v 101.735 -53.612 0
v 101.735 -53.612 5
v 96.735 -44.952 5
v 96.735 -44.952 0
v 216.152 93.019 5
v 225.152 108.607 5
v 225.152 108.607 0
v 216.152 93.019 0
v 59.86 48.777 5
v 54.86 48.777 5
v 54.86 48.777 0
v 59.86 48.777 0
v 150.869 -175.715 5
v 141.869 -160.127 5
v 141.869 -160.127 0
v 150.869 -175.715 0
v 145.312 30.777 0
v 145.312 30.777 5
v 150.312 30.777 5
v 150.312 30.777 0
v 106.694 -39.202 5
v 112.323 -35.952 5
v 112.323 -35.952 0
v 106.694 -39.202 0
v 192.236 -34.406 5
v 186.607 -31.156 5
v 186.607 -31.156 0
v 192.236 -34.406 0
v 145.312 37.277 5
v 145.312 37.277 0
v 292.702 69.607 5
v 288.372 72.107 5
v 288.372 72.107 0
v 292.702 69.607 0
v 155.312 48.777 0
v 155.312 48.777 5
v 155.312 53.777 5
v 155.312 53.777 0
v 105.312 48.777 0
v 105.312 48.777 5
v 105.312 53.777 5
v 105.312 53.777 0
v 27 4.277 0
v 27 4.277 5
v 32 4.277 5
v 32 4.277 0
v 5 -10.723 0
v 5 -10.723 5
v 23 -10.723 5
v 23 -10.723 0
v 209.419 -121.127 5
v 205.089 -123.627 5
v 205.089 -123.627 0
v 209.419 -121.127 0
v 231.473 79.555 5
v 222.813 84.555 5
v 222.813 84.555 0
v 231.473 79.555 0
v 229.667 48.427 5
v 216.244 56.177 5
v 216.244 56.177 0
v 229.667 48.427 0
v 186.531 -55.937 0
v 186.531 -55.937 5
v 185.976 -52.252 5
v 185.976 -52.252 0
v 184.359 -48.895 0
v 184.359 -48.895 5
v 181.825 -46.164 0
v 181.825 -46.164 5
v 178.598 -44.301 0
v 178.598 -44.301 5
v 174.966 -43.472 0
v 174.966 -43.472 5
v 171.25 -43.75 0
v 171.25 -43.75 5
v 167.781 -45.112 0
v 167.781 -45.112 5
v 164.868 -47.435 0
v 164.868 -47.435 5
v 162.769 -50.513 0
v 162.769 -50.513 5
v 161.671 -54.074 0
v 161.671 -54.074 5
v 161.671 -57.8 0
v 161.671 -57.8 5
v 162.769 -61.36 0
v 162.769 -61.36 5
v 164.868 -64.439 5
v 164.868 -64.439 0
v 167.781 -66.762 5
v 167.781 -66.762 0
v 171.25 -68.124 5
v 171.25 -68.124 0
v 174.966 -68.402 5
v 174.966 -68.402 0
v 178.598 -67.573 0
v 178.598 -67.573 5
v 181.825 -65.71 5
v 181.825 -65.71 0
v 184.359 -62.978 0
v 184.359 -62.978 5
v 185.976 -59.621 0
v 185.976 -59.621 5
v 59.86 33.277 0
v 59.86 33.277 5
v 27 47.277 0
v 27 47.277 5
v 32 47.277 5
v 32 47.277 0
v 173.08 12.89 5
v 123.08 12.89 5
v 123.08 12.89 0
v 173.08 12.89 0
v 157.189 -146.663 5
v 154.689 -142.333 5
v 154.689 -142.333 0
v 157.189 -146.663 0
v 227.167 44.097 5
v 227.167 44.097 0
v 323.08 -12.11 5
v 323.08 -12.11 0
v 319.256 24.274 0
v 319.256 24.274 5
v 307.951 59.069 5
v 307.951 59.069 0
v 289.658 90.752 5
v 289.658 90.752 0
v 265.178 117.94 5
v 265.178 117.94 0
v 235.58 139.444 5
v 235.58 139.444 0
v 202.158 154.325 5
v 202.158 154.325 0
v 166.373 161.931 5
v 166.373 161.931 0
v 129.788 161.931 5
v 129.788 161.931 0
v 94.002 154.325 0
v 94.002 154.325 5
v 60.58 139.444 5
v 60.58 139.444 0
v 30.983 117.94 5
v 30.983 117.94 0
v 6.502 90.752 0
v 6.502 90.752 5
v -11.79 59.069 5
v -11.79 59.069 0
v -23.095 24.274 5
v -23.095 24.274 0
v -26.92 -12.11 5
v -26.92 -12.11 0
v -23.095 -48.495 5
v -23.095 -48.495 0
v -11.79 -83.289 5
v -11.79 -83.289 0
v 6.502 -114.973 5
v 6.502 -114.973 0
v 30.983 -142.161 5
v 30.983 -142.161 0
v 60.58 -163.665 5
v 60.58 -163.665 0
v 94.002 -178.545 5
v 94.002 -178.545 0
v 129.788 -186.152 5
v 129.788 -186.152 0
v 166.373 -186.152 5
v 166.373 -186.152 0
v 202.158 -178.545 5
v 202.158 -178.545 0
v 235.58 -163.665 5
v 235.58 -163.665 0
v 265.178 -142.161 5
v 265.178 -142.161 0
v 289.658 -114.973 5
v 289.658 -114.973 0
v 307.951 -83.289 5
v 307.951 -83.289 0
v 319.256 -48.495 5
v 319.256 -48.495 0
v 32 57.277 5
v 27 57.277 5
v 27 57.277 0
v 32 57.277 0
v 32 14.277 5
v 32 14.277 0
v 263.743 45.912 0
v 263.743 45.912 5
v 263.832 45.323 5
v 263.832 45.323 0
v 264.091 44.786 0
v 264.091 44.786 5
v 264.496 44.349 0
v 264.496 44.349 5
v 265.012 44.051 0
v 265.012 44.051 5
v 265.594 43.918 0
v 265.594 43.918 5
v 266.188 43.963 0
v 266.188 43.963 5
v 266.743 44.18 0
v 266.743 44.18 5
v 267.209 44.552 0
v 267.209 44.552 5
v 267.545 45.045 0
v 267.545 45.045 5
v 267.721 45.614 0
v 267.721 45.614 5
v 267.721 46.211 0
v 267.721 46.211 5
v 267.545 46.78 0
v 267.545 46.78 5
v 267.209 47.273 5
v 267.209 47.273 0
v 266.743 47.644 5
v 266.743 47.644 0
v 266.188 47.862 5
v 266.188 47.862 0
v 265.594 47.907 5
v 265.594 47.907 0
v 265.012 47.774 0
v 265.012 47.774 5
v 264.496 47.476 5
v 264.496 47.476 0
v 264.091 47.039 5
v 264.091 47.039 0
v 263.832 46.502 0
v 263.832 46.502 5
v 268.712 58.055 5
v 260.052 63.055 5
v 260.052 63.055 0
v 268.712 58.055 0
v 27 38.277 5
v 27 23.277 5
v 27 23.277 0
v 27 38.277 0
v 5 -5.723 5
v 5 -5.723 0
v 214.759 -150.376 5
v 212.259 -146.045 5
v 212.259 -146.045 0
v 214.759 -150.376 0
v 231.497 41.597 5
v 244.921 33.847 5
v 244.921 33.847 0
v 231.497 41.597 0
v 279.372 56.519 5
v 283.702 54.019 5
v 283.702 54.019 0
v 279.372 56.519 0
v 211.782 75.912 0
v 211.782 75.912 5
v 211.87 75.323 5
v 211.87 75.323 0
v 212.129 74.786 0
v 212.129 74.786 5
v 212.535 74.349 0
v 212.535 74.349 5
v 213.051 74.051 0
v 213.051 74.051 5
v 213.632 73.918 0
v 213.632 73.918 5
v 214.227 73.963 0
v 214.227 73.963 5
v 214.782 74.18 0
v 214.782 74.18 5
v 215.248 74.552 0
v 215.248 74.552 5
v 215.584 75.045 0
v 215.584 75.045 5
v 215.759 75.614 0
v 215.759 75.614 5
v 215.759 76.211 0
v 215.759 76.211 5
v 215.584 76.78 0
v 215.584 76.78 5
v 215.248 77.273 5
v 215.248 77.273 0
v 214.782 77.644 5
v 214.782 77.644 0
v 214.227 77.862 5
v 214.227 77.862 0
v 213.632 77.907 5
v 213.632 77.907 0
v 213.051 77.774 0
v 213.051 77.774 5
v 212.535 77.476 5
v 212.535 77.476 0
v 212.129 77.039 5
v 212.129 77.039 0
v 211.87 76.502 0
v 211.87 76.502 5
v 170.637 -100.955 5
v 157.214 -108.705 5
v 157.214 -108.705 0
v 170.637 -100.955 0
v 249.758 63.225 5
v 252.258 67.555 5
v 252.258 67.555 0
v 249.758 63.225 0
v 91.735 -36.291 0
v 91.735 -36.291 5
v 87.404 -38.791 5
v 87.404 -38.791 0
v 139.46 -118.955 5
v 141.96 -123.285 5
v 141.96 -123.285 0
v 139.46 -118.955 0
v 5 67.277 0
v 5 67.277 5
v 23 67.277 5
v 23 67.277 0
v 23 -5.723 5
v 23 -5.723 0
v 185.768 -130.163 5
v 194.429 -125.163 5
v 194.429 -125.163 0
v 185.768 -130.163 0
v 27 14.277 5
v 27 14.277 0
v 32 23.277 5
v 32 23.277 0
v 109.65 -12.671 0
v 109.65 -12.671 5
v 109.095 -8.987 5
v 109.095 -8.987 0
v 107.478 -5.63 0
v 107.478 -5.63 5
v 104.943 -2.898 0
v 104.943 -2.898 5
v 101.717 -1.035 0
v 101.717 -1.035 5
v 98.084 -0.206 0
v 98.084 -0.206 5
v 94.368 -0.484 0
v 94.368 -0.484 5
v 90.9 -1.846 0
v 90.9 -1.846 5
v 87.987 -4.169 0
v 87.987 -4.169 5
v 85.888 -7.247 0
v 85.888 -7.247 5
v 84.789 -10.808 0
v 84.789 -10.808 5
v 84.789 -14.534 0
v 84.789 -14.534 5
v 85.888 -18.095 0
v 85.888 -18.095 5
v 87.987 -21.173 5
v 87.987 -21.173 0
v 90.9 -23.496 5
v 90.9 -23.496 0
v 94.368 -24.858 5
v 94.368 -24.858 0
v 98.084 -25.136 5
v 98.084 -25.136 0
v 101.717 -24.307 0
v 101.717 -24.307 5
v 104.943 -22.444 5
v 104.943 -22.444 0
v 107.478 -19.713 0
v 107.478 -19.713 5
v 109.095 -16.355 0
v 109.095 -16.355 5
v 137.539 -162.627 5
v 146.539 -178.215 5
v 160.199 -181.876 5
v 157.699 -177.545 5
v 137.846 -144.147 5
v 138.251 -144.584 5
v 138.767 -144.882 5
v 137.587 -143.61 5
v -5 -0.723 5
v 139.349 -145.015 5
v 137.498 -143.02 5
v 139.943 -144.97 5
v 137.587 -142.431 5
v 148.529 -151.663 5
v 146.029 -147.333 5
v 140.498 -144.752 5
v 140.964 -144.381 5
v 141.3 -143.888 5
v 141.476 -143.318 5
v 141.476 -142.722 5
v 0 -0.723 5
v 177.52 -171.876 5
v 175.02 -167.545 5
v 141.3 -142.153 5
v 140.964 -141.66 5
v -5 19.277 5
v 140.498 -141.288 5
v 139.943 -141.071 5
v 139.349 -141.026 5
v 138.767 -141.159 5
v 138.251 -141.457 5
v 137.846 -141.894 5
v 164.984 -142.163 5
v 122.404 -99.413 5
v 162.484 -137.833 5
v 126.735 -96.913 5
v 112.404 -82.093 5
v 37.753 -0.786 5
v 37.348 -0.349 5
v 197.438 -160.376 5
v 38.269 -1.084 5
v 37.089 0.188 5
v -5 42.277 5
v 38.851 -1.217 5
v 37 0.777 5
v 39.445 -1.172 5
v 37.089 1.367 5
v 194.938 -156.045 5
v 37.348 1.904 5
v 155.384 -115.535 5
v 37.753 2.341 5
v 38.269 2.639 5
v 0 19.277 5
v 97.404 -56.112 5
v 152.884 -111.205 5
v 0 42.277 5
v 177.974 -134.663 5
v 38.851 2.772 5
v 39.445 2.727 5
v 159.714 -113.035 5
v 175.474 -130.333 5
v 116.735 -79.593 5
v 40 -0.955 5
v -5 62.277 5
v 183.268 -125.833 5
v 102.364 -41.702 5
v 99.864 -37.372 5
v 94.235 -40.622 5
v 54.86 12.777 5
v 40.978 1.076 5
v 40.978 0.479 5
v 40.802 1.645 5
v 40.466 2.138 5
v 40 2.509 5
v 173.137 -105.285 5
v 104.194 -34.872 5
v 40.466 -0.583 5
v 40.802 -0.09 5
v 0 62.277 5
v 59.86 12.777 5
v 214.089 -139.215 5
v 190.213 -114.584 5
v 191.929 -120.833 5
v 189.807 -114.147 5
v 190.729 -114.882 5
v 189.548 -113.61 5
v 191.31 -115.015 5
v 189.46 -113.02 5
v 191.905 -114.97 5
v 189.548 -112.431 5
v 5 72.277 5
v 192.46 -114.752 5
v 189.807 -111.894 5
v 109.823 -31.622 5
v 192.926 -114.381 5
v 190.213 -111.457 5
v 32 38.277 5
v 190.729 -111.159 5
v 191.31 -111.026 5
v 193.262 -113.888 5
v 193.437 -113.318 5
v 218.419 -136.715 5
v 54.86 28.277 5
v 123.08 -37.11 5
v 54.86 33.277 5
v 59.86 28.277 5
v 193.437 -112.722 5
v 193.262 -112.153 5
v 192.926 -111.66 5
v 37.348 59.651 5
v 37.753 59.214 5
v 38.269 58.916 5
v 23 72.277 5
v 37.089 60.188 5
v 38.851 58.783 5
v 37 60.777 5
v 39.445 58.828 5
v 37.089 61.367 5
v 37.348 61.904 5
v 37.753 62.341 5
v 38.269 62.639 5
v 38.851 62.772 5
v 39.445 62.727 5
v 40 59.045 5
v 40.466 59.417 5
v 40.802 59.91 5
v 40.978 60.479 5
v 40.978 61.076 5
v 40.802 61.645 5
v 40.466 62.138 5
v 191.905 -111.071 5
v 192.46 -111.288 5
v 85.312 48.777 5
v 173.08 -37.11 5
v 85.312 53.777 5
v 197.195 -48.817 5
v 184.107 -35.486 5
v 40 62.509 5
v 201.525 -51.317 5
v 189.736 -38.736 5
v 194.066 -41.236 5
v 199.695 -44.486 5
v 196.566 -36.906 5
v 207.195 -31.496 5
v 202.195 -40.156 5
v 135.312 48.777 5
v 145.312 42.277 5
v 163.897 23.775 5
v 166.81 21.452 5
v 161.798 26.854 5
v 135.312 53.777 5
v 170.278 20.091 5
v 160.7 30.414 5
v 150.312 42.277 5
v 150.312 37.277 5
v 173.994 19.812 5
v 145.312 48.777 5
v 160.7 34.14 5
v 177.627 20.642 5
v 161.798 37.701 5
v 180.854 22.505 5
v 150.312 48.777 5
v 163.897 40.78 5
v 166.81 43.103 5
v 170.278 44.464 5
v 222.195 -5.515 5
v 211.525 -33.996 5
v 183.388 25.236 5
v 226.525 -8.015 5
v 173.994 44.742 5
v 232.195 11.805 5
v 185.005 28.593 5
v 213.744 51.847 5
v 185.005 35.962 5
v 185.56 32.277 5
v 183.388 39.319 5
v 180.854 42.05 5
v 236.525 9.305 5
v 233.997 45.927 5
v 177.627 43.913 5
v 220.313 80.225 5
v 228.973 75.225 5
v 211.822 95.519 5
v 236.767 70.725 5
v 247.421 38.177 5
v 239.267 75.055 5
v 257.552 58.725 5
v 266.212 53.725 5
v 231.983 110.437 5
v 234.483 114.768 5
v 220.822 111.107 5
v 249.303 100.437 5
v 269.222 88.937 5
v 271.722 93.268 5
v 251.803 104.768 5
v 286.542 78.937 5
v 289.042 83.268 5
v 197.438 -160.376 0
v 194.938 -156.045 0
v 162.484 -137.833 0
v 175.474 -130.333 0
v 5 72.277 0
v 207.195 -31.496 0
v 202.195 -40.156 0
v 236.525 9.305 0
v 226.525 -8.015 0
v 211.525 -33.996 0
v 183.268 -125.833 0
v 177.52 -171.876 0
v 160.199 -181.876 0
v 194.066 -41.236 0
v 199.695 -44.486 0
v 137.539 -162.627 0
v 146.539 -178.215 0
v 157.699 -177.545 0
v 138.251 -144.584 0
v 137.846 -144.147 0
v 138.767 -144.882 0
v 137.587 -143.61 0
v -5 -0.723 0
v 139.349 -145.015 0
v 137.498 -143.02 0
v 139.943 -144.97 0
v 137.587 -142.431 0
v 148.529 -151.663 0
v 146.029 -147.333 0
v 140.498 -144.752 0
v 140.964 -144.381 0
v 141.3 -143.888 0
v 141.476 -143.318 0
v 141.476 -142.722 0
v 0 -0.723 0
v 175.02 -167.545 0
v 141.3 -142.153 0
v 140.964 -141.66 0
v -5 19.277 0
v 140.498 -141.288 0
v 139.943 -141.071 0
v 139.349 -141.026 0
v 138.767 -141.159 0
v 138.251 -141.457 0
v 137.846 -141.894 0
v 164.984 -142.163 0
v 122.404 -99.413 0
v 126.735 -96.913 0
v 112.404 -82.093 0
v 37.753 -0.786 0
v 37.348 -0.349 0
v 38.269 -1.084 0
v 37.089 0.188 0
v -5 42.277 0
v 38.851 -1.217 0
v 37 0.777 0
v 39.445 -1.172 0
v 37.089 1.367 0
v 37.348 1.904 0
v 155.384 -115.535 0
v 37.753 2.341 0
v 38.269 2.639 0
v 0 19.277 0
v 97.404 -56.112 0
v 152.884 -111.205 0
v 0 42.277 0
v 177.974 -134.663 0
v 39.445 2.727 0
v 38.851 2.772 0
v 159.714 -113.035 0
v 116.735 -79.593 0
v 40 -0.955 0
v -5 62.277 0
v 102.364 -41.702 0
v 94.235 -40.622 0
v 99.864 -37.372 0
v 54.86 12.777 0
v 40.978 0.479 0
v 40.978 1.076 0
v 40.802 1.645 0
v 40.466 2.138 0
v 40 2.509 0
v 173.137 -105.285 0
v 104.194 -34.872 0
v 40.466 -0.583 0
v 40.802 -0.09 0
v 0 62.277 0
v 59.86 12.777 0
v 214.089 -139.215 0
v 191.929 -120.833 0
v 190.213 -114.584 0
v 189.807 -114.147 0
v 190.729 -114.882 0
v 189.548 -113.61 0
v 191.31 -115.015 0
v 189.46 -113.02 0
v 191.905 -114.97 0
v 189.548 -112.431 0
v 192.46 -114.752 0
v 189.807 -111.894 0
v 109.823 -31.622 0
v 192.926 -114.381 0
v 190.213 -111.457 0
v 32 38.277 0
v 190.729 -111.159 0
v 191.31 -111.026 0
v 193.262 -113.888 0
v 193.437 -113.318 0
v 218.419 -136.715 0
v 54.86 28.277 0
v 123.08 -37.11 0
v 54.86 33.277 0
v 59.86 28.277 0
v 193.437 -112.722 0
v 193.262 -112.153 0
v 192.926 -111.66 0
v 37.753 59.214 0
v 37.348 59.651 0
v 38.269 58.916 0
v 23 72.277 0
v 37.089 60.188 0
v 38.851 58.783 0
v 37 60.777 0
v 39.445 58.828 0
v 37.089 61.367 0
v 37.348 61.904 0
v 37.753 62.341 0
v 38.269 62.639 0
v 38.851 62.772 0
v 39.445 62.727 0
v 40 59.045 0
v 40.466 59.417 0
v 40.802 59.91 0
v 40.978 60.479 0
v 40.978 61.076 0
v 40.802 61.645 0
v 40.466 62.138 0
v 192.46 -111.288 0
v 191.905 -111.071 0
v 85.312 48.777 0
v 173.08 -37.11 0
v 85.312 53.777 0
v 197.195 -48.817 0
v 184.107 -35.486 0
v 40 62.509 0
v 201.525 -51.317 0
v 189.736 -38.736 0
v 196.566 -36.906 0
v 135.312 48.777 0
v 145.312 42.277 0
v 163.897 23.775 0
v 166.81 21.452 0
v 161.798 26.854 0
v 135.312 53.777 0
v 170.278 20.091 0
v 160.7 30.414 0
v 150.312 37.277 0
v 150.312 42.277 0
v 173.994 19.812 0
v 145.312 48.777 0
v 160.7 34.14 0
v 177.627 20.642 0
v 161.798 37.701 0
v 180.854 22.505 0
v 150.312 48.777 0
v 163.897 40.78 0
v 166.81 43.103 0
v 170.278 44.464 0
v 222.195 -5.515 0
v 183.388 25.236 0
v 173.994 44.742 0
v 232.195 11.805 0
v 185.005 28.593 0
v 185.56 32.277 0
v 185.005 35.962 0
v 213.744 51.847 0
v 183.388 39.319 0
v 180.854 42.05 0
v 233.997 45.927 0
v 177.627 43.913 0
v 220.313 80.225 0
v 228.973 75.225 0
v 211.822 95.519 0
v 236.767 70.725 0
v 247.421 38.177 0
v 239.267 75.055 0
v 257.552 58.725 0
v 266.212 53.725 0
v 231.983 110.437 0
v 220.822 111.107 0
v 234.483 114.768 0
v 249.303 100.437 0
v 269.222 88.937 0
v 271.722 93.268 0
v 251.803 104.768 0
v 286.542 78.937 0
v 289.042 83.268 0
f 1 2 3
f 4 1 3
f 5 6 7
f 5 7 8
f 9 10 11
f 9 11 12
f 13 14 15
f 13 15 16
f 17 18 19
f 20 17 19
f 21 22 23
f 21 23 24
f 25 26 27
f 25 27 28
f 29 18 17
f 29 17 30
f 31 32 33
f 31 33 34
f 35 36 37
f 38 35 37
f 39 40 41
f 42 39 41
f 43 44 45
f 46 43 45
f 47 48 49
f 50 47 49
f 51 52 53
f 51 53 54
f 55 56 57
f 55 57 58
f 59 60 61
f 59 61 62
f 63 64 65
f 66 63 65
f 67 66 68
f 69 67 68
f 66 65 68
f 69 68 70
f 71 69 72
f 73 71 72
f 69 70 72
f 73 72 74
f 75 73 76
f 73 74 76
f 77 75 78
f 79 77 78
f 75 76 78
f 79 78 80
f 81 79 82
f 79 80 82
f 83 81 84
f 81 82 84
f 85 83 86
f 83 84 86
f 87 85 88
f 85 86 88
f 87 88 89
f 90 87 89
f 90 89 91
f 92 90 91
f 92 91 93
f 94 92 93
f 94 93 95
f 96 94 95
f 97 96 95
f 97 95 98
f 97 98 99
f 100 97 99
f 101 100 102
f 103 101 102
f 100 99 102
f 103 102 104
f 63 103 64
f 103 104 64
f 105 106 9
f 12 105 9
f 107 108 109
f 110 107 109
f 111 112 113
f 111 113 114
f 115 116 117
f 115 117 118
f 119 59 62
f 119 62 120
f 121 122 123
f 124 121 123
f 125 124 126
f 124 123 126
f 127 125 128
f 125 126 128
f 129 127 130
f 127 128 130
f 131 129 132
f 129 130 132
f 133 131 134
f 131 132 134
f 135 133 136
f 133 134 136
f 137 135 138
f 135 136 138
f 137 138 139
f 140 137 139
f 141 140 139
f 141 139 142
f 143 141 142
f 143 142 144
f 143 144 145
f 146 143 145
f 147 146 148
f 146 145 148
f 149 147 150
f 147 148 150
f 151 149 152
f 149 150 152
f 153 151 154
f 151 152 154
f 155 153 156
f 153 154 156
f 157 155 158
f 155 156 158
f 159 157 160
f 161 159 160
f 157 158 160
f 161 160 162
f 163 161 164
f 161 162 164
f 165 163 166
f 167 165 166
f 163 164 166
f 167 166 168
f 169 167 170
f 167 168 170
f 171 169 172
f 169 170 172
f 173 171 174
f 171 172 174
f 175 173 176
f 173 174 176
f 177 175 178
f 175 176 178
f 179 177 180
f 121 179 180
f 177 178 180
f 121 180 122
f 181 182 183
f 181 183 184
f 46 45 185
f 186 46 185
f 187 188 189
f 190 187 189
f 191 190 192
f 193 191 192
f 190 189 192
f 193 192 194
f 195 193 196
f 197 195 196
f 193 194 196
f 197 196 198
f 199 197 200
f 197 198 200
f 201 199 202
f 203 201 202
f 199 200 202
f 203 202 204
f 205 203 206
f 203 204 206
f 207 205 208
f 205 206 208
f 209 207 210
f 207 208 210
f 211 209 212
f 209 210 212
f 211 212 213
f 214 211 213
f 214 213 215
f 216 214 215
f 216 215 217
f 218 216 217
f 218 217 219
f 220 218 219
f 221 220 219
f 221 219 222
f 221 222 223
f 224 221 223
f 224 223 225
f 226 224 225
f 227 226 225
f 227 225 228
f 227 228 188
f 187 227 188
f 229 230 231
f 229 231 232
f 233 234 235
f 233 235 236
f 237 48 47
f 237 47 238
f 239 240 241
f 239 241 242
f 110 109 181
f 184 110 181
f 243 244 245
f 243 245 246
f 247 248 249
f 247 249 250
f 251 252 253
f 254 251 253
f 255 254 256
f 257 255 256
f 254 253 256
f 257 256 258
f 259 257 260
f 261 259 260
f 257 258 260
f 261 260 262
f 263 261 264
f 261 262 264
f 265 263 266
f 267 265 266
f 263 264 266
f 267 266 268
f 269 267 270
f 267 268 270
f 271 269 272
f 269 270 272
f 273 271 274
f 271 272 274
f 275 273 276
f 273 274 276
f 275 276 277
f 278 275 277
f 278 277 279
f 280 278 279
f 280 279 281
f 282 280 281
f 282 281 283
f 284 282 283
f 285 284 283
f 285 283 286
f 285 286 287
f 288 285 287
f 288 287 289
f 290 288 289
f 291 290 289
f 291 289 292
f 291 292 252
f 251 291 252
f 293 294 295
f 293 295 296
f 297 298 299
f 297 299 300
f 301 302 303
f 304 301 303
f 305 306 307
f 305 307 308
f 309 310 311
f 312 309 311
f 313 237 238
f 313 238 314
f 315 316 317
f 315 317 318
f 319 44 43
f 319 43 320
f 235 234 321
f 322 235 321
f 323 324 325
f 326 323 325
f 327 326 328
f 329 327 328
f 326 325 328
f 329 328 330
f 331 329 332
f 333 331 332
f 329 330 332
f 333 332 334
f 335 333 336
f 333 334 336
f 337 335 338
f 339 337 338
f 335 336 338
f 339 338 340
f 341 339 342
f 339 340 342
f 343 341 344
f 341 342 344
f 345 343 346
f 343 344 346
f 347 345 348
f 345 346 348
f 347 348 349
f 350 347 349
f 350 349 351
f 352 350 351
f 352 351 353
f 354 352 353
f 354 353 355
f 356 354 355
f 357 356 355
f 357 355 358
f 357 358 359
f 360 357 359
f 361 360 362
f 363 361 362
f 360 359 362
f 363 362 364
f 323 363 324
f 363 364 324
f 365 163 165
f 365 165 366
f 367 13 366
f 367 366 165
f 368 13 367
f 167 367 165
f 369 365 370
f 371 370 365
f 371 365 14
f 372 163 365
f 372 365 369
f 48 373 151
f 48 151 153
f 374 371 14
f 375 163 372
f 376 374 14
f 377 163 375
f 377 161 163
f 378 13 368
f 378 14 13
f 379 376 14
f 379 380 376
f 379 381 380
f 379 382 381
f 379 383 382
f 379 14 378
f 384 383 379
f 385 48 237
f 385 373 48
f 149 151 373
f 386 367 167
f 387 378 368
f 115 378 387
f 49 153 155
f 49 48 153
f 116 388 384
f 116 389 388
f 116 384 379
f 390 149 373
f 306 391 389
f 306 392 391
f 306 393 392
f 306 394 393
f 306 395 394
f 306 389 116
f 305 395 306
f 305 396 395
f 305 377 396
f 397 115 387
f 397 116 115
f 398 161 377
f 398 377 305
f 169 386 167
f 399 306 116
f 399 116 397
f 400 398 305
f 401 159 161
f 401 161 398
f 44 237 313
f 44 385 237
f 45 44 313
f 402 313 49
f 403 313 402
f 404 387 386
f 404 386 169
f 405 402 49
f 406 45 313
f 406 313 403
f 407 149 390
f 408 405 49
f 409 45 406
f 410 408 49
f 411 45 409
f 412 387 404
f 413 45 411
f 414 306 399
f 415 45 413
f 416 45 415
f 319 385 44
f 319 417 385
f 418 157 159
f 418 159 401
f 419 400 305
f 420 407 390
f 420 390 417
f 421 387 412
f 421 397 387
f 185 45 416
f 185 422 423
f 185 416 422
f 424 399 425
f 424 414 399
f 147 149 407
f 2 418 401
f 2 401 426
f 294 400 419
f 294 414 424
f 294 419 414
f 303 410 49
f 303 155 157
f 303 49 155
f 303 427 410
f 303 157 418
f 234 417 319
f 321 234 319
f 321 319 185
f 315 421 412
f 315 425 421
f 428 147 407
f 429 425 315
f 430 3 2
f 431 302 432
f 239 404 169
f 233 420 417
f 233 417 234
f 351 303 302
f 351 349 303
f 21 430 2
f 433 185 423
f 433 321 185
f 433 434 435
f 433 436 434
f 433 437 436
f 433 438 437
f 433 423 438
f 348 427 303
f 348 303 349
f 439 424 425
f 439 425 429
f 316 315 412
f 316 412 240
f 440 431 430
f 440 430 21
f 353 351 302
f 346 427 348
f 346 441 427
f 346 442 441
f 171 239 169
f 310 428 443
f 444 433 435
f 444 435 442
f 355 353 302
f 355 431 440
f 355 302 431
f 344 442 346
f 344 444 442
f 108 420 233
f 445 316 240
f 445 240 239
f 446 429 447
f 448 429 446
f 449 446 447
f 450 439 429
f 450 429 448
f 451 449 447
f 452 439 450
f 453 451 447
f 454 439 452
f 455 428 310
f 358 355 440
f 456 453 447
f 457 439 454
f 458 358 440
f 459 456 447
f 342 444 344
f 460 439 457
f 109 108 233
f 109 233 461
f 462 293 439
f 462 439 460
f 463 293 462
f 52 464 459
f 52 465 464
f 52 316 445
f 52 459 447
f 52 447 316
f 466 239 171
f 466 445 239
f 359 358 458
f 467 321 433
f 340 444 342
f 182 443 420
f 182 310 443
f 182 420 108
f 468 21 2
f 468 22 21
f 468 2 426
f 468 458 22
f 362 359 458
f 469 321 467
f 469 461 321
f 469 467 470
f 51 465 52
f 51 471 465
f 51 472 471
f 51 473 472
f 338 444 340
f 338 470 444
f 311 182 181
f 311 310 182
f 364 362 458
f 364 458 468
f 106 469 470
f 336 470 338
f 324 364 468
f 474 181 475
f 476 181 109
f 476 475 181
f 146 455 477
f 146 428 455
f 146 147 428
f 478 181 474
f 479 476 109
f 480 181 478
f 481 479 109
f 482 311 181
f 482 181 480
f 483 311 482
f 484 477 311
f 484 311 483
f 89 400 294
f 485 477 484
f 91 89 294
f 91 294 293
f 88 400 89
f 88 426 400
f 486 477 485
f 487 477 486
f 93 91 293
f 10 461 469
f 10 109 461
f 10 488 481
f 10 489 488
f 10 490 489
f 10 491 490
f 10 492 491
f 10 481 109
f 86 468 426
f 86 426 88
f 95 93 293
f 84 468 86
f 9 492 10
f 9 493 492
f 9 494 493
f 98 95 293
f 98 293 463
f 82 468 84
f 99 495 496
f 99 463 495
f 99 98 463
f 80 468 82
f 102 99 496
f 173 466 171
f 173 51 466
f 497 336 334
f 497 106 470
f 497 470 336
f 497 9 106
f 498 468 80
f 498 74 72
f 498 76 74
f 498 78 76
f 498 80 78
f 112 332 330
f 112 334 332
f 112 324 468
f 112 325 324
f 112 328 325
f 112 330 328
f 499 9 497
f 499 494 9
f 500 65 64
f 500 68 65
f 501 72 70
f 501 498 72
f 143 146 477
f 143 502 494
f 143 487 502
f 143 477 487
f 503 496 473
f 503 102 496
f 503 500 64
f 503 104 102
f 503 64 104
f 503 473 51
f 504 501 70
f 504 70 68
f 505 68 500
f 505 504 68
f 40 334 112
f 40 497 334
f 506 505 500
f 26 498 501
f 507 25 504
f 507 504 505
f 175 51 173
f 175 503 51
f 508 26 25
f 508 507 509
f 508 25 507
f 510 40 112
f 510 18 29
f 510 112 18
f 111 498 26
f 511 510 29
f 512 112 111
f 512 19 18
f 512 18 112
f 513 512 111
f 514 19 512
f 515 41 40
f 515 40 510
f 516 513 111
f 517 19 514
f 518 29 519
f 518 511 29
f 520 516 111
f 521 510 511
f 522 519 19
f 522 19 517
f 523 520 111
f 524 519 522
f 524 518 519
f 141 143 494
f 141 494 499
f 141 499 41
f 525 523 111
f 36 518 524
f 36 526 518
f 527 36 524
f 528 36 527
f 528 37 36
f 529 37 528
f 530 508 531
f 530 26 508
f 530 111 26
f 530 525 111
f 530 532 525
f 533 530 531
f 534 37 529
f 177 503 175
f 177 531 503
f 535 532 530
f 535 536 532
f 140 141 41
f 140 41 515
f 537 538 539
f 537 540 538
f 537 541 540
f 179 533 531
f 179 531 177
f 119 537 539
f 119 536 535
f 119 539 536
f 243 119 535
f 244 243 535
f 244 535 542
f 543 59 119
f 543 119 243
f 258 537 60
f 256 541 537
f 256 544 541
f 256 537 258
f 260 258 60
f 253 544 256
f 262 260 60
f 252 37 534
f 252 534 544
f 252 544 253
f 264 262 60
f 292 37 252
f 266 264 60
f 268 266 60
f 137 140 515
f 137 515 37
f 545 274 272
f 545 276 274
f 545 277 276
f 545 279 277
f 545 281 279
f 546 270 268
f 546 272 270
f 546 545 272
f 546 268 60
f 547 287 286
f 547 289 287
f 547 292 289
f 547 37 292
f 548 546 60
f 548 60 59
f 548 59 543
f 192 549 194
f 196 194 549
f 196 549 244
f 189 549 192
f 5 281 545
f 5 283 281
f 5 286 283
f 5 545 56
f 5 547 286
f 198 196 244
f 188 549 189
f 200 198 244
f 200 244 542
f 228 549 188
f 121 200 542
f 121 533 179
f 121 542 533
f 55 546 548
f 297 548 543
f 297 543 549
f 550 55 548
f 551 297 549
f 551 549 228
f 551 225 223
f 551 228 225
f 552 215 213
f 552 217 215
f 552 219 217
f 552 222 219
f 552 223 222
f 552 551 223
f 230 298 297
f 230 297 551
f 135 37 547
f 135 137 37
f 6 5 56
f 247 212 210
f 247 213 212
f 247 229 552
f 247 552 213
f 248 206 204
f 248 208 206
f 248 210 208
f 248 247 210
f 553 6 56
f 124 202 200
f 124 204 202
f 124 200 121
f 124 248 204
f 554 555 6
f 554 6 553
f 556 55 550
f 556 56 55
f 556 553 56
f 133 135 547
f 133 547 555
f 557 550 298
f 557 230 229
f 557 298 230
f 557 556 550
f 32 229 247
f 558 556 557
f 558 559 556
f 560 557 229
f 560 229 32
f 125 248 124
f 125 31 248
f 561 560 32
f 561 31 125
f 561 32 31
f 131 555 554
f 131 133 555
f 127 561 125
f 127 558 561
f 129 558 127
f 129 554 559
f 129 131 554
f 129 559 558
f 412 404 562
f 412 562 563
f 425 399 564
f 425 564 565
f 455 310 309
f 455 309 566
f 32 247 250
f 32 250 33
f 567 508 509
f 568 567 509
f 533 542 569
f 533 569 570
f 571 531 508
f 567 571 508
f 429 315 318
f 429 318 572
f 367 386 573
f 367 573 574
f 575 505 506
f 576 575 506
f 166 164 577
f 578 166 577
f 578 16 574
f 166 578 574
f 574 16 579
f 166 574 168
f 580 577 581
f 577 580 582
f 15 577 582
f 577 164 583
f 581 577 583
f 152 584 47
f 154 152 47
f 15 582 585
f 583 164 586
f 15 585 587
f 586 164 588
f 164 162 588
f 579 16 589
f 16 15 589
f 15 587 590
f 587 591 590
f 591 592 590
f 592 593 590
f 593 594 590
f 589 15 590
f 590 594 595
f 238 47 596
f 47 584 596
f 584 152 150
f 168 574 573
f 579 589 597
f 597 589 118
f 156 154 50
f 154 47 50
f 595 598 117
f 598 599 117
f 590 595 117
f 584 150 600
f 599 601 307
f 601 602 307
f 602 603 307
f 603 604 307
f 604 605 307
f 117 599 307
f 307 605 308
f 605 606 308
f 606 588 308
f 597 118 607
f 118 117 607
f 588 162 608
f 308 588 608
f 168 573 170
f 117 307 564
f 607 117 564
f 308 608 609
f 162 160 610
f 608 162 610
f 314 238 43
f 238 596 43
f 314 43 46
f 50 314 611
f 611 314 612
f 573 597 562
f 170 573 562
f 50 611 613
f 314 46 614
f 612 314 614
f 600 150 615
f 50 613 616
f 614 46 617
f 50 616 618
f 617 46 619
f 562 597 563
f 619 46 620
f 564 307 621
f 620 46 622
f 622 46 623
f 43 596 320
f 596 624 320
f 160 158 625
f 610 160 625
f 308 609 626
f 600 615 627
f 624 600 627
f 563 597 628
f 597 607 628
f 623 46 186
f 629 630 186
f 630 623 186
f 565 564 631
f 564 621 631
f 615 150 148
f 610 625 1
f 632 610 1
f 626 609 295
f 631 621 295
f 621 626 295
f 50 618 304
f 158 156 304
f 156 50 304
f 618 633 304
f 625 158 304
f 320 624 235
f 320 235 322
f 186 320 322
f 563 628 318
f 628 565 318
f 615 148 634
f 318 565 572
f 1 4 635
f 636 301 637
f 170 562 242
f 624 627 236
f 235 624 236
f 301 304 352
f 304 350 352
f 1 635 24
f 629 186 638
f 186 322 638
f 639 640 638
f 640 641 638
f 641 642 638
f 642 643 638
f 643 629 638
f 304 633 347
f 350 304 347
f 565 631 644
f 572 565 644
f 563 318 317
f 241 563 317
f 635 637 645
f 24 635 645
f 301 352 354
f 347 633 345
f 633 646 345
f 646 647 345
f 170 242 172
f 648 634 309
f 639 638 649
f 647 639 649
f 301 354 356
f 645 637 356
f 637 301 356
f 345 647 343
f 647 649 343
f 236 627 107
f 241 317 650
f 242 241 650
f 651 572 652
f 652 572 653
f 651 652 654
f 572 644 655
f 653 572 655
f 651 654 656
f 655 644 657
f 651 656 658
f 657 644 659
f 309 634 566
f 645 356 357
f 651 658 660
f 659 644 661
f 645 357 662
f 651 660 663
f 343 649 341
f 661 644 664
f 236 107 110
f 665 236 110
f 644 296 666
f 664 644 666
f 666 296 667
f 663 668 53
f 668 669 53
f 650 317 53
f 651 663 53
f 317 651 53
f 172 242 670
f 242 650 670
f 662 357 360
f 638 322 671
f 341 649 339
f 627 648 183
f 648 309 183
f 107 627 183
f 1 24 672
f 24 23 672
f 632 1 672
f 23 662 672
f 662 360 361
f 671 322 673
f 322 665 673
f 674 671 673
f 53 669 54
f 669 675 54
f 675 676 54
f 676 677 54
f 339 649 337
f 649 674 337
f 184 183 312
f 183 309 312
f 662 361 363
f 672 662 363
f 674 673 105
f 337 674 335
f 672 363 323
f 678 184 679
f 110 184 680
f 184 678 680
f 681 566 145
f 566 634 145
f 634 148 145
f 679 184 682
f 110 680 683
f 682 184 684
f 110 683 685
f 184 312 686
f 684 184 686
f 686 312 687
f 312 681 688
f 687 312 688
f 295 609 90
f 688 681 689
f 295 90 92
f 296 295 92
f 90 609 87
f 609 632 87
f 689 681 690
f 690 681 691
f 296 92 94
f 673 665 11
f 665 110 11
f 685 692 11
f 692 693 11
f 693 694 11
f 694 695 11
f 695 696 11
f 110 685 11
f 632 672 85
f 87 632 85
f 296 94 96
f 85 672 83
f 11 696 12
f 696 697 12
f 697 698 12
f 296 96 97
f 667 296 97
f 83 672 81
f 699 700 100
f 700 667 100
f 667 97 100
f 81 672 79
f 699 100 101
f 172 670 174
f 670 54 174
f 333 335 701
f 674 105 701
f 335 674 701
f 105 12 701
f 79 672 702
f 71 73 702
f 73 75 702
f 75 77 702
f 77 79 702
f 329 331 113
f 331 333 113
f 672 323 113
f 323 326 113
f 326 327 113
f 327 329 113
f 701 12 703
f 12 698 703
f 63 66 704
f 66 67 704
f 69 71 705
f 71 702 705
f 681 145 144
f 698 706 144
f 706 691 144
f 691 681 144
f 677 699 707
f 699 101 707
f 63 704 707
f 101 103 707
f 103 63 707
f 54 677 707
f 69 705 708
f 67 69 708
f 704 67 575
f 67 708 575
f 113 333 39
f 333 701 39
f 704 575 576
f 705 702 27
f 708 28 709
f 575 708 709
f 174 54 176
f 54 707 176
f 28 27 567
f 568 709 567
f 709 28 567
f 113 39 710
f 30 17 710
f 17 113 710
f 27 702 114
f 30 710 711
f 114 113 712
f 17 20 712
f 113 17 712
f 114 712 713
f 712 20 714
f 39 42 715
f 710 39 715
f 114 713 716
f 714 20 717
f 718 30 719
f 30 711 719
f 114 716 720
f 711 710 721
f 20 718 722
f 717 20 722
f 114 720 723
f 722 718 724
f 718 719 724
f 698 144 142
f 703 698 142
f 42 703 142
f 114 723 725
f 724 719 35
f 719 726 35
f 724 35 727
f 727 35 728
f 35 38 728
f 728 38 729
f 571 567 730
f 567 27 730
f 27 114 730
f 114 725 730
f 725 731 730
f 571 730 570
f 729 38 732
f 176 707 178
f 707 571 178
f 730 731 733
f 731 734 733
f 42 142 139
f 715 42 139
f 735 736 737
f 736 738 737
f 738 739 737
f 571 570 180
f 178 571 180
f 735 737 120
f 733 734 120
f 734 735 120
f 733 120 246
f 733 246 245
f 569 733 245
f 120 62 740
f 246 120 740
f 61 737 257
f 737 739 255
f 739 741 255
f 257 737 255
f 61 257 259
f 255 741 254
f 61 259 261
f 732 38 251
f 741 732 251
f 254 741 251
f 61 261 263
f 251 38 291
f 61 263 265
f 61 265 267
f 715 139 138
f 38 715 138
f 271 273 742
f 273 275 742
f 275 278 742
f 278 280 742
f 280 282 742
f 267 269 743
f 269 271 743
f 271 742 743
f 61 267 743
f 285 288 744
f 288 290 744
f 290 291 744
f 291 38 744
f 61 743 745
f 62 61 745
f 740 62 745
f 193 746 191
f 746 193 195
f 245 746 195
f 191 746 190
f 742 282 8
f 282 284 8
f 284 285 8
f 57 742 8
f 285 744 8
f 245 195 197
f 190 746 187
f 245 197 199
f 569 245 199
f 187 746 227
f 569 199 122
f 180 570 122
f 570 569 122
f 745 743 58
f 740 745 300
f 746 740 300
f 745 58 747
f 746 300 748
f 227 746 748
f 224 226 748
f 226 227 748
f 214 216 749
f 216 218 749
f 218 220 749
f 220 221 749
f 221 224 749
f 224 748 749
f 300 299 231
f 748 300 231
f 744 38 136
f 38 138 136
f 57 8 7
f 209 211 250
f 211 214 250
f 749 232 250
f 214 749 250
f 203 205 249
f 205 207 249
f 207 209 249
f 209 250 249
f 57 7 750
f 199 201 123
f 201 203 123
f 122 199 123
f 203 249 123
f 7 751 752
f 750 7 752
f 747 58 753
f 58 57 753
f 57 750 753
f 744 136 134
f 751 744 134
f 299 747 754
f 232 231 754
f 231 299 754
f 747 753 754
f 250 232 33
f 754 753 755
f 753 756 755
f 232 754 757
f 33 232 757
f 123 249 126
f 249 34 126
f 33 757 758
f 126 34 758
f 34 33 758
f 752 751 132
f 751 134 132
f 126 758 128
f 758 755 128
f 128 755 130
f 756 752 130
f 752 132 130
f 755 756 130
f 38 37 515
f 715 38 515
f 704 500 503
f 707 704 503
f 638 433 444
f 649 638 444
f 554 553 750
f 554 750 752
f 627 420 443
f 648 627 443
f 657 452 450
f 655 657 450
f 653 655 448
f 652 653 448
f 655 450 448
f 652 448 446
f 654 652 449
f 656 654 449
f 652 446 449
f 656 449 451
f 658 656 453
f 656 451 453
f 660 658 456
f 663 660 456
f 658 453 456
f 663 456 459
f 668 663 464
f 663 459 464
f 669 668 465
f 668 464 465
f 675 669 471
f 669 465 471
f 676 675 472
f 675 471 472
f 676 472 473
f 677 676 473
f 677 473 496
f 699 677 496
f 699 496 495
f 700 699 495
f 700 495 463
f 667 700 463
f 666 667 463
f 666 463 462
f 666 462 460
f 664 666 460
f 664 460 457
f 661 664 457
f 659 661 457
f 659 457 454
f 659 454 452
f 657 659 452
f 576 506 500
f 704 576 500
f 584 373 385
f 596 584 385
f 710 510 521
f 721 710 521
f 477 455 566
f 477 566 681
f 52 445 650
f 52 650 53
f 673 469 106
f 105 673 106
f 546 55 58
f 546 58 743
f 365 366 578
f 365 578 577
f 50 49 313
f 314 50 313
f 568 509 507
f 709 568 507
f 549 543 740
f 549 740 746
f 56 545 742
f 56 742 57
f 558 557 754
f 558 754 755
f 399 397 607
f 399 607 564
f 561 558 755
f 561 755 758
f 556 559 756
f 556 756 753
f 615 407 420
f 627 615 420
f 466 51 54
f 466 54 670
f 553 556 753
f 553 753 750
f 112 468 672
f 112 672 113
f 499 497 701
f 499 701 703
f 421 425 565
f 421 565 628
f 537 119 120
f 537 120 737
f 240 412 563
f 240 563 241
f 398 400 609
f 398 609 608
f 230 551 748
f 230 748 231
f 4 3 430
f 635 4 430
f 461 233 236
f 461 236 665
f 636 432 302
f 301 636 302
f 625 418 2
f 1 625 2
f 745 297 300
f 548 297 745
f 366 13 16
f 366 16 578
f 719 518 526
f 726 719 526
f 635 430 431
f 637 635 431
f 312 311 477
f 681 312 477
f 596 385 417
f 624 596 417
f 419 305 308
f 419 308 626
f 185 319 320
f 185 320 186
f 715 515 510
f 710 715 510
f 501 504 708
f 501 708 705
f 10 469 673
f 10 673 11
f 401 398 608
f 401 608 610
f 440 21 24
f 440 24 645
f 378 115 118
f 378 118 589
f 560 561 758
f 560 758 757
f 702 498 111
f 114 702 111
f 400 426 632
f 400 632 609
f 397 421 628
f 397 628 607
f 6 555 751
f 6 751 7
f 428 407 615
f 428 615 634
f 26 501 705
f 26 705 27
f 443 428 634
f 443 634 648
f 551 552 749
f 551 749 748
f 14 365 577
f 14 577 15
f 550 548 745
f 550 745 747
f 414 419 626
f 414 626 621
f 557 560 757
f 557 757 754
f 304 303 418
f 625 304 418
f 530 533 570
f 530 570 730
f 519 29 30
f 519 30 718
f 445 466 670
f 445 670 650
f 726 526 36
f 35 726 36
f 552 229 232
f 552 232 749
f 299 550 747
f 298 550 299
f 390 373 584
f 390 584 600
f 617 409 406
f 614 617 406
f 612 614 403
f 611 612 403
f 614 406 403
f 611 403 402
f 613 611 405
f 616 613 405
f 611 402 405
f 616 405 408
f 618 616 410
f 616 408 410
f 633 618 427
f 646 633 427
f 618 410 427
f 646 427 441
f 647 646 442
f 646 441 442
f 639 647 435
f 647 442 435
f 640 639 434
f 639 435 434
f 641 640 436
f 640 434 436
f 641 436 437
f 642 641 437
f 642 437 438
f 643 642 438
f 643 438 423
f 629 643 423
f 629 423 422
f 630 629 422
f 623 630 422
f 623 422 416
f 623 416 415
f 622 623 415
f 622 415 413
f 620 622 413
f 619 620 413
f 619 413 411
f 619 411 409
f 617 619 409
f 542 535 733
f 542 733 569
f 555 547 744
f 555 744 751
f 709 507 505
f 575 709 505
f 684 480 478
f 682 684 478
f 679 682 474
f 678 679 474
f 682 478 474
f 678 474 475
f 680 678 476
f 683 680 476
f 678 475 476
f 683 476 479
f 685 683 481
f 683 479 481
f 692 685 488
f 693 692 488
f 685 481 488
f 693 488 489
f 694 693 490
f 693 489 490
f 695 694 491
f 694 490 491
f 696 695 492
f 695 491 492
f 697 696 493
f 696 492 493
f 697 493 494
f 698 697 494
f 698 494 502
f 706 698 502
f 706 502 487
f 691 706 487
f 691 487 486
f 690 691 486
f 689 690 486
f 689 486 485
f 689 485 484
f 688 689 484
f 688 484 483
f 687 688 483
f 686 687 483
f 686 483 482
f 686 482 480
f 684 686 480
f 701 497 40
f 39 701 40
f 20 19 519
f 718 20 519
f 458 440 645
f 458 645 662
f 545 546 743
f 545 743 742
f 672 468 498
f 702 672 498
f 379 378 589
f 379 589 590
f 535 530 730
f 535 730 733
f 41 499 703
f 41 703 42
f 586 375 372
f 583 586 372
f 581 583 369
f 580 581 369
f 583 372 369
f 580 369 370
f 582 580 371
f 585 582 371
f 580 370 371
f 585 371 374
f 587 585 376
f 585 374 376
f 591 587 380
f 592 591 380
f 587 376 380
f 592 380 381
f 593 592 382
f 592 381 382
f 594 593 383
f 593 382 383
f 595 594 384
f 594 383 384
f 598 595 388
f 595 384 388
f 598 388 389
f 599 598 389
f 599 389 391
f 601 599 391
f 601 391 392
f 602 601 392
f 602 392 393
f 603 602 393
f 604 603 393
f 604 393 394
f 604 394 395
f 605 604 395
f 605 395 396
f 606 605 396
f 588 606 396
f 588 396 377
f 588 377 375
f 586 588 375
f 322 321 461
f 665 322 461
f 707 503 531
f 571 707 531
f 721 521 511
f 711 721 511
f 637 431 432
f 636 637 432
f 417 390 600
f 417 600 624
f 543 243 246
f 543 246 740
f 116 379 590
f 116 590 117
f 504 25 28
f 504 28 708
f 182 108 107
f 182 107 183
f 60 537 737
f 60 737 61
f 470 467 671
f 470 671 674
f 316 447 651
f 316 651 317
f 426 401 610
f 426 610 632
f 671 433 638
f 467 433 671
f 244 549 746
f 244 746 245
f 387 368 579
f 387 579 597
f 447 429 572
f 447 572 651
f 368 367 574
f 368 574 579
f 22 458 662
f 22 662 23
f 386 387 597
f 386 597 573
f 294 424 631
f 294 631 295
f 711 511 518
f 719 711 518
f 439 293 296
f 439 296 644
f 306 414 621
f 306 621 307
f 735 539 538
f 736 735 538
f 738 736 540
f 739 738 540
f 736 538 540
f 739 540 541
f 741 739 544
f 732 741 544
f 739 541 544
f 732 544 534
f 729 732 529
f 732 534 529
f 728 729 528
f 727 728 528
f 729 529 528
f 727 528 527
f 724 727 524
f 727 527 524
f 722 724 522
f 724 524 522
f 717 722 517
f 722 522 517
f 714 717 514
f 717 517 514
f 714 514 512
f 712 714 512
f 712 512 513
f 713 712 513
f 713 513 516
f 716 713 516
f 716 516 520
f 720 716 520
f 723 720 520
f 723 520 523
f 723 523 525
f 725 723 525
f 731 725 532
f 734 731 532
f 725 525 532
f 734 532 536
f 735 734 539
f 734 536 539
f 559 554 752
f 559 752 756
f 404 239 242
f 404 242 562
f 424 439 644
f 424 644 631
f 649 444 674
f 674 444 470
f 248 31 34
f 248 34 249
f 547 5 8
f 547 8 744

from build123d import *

# Parameters (mm, degrees)
ESQUISSE1_R                = 175
BOSS_EXTRU_1_DEPTH         = 5
ESQUISSE2_W                = 18
ESQUISSE2_H                = 5
ESQUISSE2_W_2              = 5
ESQUISSE2_H_2              = 20
ESQUISSE2_H_3              = 10
ESQUISSE2_H_4              = 15
ESQUISSE2_H_5              = 15.5
ESQUISSE2_W_3              = 20
ESQUISSE2_H_6              = 6.5
ENL_V_MAT_EXTRU_1_DEPTH    = 5
ESQUISSE6_R                = 12.5
ESQUISSE6_W                = 50
ESQUISSE6_H                = 50
ENL_V_MAT_EXTRU_6_DEPTH    = 5
TROUS_DE_CENTRAGE_4_0MM1_D = 4


with BuildPart() as part:
    # Esquisse1 → Boss.-Extru.1 (new body)
    with BuildSketch(Plane.XY):
        with Locations((148.080426897, -12.110171348)):
            Circle(ESQUISSE1_R)
    extrude(amount=BOSS_EXTRU_1_DEPTH)

    # Esquisse2 → Enlèv. mat.-Extru.1 (cut)
    with BuildSketch(Plane.XY.offset(5)):
        Polygon((135.311788567, 53.777441362), (135.311788567, 48.777441362), (145.311788567, 48.777441362), (145.311788567, 42.277441362), (150.311788567, 42.277441362), (150.311788567, 48.777441362), (155.311788567, 48.777441362), (155.311788567, 53.777441362), align=None)
        with Locations((14, 69.777441362)):
            Rectangle(ESQUISSE2_W, ESQUISSE2_H)
        with Locations((-2.5, 52.277441362)):
            Rectangle(ESQUISSE2_W_2, ESQUISSE2_H_2)
        with Locations((-2.5, 9.277441362)):
            Rectangle(ESQUISSE2_W_2, ESQUISSE2_H_2)
        with Locations((14, -8.222558638)):
            Rectangle(ESQUISSE2_W, ESQUISSE2_H)
        with Locations((29.5, 9.277441362)):
            Rectangle(ESQUISSE2_W_2, ESQUISSE2_H_3)
        with Locations((29.5, 30.777441362)):
            Rectangle(ESQUISSE2_W_2, ESQUISSE2_H_4)
        with Locations((29.5, 52.277441362)):
            Rectangle(ESQUISSE2_W_2, ESQUISSE2_H_3)
        with Locations((57.36, 41.027441362)):
            Rectangle(ESQUISSE2_W_2, ESQUISSE2_H_5)
        with Locations((57.36, 20.527441362)):
            Rectangle(ESQUISSE2_W_2, ESQUISSE2_H_5)
        with Locations((95.311788567, 51.277441362)):
            Rectangle(ESQUISSE2_W_3, ESQUISSE2_H)
        with Locations((147.811788567, 34.027441362)):
            Rectangle(ESQUISSE2_W_2, ESQUISSE2_H_6)
        Polygon((292.702456717, 69.607306773), (283.702456717, 54.018849505), (279.372329698, 56.518849505), (288.372329698, 72.107306773), align=None)
        Polygon((289.042202679, 83.267560811), (286.542202679, 78.937433792), (269.221694603, 88.937433792), (271.721694603, 93.267560811), align=None)
        Polygon((251.803110316, 104.767560811), (249.303110316, 100.437433792), (231.982602241, 110.437433792), (234.482602241, 114.767560811), align=None)
        Polygon((225.152475222, 108.607306773), (216.152475222, 93.018849505), (211.822348203, 95.518849505), (220.822348203, 111.107306773), align=None)
        Polygon((231.472983297, 79.55474789), (228.972983297, 75.224620871), (220.31272926, 80.224620871), (222.81272926, 84.55474789), align=None)
        Polygon((252.257592988, 67.55474789), (249.757592988, 63.224620871), (236.767211932, 70.724620871), (239.267211932, 75.05474789), align=None)
        Polygon((268.71207566, 58.05474789), (266.21207566, 53.724620871), (257.551821622, 58.724620871), (260.051821622, 63.05474789), align=None)
        Polygon((247.420859728, 38.17728014), (244.920859728, 33.847153121), (231.497465969, 41.597153121), (233.997465969, 45.92728014), align=None)
        Polygon((229.66733895, 48.42728014), (227.16733895, 44.097153121), (213.743945192, 51.847153121), (216.243945192, 56.17728014), align=None)
        Polygon((211.525092463, -33.996012539), (207.194965444, -31.496012539), (202.194965444, -40.156266577), (196.56580032, -36.906266577), (194.06580032, -41.236393596), (199.694965444, -44.486393596), (197.194965444, -48.816520615), (201.525092463, -51.316520615), align=None)
        Polygon((236.525092463, 9.30525765), (226.525092463, -8.015250425), (222.194965444, -5.515250425), (232.194965444, 11.80525765), align=None)
        Polygon((192.235673301, -34.406266577), (189.735673301, -38.736393596), (184.106508176, -35.486393596), (186.606508176, -31.156266577), align=None)
        Polygon((146.538823973, -178.215262181), (137.538823973, -162.626804912), (141.868950992, -160.126804912), (150.868950992, -175.715262181), align=None)
        Polygon((160.199078011, -181.875516218), (157.699078011, -177.545389199), (175.019586086, -167.545389199), (177.519586086, -171.875516218), align=None)
        Polygon((197.438170373, -160.375516218), (194.938170373, -156.045389199), (212.258678449, -146.045389199), (214.758678449, -150.375516218), align=None)
        Polygon((214.088805468, -139.215262181), (205.088805468, -123.626804912), (209.418932487, -121.126804912), (218.418932487, -136.715262181), align=None)
        Polygon((185.768297392, -130.162703297), (183.268297392, -125.832576278), (191.92855143, -120.832576278), (194.42855143, -125.162703297), align=None)
        Polygon((164.983687701, -142.162703297), (162.483687701, -137.832576278), (175.474068758, -130.332576278), (177.974068758, -134.662703297), align=None)
        Polygon((148.52920503, -151.662703297), (146.02920503, -147.332576278), (154.689459067, -142.332576278), (157.189459067, -146.662703297), align=None)
        Polygon((141.960420962, -123.285235548), (139.460420962, -118.955108529), (152.88381472, -111.205108529), (155.38381472, -115.535235548), align=None)
        Polygon((159.713941739, -113.035235548), (157.213941739, -108.705108529), (170.637335498, -100.955108529), (173.137335498, -105.285235548), align=None)
        Polygon((97.404399659, -56.111942869), (101.734526678, -53.611942869), (96.734526678, -44.951688831), (102.363691803, -41.701688831), (99.863691803, -37.371561812), (94.234526678, -40.621561812), (91.734526678, -36.291434793), (87.404399659, -38.791434793), align=None)
        Polygon((122.404399659, -99.413213058), (112.404399659, -82.092704982), (116.734526678, -79.592704982), (126.734526678, -96.913213058), align=None)
        Polygon((106.693818822, -39.201688831), (104.193818822, -34.871561812), (109.822983946, -31.621561812), (112.322983946, -35.951688831), align=None)
    extrude(amount=-ENL_V_MAT_EXTRU_1_DEPTH, mode=Mode.SUBTRACT)

    # Esquisse6 → Enlèv. mat.-Extru.6 (cut)
    with BuildSketch(Plane.XY.offset(5)):
        with Locations((173.06, 32.277441362)):
            Circle(ESQUISSE6_R)
        with Locations((174.031440566, -55.936922587)):
            Circle(ESQUISSE6_R)
        with Locations((97.149840124, -12.67103282)):
            Circle(ESQUISSE6_R)
        with Locations((148.080426897, -12.110171348)):
            Rectangle(ESQUISSE6_W, ESQUISSE6_H)
    extrude(amount=-ENL_V_MAT_EXTRU_6_DEPTH, mode=Mode.SUBTRACT)

    # Trous de centrage Ø4.0mm1 (through all)
    with Locations(Plane(origin=(148.080426897, -12.110171348, -78), x_dir=(1, 0, 0), z_dir=(0, 0, -1))):
        with Locations((65.70121345, -88.022614393), (117.662737677, -58.022614393), (-109.080426897, -72.887612711), (-109.080426897, -12.887612711), (-8.58231078, 130.910227103), (43.379213447, 100.910227103)):
            Hole(TROUS_DE_CENTRAGE_4_0MM1_D / 2)


solid = part.part
